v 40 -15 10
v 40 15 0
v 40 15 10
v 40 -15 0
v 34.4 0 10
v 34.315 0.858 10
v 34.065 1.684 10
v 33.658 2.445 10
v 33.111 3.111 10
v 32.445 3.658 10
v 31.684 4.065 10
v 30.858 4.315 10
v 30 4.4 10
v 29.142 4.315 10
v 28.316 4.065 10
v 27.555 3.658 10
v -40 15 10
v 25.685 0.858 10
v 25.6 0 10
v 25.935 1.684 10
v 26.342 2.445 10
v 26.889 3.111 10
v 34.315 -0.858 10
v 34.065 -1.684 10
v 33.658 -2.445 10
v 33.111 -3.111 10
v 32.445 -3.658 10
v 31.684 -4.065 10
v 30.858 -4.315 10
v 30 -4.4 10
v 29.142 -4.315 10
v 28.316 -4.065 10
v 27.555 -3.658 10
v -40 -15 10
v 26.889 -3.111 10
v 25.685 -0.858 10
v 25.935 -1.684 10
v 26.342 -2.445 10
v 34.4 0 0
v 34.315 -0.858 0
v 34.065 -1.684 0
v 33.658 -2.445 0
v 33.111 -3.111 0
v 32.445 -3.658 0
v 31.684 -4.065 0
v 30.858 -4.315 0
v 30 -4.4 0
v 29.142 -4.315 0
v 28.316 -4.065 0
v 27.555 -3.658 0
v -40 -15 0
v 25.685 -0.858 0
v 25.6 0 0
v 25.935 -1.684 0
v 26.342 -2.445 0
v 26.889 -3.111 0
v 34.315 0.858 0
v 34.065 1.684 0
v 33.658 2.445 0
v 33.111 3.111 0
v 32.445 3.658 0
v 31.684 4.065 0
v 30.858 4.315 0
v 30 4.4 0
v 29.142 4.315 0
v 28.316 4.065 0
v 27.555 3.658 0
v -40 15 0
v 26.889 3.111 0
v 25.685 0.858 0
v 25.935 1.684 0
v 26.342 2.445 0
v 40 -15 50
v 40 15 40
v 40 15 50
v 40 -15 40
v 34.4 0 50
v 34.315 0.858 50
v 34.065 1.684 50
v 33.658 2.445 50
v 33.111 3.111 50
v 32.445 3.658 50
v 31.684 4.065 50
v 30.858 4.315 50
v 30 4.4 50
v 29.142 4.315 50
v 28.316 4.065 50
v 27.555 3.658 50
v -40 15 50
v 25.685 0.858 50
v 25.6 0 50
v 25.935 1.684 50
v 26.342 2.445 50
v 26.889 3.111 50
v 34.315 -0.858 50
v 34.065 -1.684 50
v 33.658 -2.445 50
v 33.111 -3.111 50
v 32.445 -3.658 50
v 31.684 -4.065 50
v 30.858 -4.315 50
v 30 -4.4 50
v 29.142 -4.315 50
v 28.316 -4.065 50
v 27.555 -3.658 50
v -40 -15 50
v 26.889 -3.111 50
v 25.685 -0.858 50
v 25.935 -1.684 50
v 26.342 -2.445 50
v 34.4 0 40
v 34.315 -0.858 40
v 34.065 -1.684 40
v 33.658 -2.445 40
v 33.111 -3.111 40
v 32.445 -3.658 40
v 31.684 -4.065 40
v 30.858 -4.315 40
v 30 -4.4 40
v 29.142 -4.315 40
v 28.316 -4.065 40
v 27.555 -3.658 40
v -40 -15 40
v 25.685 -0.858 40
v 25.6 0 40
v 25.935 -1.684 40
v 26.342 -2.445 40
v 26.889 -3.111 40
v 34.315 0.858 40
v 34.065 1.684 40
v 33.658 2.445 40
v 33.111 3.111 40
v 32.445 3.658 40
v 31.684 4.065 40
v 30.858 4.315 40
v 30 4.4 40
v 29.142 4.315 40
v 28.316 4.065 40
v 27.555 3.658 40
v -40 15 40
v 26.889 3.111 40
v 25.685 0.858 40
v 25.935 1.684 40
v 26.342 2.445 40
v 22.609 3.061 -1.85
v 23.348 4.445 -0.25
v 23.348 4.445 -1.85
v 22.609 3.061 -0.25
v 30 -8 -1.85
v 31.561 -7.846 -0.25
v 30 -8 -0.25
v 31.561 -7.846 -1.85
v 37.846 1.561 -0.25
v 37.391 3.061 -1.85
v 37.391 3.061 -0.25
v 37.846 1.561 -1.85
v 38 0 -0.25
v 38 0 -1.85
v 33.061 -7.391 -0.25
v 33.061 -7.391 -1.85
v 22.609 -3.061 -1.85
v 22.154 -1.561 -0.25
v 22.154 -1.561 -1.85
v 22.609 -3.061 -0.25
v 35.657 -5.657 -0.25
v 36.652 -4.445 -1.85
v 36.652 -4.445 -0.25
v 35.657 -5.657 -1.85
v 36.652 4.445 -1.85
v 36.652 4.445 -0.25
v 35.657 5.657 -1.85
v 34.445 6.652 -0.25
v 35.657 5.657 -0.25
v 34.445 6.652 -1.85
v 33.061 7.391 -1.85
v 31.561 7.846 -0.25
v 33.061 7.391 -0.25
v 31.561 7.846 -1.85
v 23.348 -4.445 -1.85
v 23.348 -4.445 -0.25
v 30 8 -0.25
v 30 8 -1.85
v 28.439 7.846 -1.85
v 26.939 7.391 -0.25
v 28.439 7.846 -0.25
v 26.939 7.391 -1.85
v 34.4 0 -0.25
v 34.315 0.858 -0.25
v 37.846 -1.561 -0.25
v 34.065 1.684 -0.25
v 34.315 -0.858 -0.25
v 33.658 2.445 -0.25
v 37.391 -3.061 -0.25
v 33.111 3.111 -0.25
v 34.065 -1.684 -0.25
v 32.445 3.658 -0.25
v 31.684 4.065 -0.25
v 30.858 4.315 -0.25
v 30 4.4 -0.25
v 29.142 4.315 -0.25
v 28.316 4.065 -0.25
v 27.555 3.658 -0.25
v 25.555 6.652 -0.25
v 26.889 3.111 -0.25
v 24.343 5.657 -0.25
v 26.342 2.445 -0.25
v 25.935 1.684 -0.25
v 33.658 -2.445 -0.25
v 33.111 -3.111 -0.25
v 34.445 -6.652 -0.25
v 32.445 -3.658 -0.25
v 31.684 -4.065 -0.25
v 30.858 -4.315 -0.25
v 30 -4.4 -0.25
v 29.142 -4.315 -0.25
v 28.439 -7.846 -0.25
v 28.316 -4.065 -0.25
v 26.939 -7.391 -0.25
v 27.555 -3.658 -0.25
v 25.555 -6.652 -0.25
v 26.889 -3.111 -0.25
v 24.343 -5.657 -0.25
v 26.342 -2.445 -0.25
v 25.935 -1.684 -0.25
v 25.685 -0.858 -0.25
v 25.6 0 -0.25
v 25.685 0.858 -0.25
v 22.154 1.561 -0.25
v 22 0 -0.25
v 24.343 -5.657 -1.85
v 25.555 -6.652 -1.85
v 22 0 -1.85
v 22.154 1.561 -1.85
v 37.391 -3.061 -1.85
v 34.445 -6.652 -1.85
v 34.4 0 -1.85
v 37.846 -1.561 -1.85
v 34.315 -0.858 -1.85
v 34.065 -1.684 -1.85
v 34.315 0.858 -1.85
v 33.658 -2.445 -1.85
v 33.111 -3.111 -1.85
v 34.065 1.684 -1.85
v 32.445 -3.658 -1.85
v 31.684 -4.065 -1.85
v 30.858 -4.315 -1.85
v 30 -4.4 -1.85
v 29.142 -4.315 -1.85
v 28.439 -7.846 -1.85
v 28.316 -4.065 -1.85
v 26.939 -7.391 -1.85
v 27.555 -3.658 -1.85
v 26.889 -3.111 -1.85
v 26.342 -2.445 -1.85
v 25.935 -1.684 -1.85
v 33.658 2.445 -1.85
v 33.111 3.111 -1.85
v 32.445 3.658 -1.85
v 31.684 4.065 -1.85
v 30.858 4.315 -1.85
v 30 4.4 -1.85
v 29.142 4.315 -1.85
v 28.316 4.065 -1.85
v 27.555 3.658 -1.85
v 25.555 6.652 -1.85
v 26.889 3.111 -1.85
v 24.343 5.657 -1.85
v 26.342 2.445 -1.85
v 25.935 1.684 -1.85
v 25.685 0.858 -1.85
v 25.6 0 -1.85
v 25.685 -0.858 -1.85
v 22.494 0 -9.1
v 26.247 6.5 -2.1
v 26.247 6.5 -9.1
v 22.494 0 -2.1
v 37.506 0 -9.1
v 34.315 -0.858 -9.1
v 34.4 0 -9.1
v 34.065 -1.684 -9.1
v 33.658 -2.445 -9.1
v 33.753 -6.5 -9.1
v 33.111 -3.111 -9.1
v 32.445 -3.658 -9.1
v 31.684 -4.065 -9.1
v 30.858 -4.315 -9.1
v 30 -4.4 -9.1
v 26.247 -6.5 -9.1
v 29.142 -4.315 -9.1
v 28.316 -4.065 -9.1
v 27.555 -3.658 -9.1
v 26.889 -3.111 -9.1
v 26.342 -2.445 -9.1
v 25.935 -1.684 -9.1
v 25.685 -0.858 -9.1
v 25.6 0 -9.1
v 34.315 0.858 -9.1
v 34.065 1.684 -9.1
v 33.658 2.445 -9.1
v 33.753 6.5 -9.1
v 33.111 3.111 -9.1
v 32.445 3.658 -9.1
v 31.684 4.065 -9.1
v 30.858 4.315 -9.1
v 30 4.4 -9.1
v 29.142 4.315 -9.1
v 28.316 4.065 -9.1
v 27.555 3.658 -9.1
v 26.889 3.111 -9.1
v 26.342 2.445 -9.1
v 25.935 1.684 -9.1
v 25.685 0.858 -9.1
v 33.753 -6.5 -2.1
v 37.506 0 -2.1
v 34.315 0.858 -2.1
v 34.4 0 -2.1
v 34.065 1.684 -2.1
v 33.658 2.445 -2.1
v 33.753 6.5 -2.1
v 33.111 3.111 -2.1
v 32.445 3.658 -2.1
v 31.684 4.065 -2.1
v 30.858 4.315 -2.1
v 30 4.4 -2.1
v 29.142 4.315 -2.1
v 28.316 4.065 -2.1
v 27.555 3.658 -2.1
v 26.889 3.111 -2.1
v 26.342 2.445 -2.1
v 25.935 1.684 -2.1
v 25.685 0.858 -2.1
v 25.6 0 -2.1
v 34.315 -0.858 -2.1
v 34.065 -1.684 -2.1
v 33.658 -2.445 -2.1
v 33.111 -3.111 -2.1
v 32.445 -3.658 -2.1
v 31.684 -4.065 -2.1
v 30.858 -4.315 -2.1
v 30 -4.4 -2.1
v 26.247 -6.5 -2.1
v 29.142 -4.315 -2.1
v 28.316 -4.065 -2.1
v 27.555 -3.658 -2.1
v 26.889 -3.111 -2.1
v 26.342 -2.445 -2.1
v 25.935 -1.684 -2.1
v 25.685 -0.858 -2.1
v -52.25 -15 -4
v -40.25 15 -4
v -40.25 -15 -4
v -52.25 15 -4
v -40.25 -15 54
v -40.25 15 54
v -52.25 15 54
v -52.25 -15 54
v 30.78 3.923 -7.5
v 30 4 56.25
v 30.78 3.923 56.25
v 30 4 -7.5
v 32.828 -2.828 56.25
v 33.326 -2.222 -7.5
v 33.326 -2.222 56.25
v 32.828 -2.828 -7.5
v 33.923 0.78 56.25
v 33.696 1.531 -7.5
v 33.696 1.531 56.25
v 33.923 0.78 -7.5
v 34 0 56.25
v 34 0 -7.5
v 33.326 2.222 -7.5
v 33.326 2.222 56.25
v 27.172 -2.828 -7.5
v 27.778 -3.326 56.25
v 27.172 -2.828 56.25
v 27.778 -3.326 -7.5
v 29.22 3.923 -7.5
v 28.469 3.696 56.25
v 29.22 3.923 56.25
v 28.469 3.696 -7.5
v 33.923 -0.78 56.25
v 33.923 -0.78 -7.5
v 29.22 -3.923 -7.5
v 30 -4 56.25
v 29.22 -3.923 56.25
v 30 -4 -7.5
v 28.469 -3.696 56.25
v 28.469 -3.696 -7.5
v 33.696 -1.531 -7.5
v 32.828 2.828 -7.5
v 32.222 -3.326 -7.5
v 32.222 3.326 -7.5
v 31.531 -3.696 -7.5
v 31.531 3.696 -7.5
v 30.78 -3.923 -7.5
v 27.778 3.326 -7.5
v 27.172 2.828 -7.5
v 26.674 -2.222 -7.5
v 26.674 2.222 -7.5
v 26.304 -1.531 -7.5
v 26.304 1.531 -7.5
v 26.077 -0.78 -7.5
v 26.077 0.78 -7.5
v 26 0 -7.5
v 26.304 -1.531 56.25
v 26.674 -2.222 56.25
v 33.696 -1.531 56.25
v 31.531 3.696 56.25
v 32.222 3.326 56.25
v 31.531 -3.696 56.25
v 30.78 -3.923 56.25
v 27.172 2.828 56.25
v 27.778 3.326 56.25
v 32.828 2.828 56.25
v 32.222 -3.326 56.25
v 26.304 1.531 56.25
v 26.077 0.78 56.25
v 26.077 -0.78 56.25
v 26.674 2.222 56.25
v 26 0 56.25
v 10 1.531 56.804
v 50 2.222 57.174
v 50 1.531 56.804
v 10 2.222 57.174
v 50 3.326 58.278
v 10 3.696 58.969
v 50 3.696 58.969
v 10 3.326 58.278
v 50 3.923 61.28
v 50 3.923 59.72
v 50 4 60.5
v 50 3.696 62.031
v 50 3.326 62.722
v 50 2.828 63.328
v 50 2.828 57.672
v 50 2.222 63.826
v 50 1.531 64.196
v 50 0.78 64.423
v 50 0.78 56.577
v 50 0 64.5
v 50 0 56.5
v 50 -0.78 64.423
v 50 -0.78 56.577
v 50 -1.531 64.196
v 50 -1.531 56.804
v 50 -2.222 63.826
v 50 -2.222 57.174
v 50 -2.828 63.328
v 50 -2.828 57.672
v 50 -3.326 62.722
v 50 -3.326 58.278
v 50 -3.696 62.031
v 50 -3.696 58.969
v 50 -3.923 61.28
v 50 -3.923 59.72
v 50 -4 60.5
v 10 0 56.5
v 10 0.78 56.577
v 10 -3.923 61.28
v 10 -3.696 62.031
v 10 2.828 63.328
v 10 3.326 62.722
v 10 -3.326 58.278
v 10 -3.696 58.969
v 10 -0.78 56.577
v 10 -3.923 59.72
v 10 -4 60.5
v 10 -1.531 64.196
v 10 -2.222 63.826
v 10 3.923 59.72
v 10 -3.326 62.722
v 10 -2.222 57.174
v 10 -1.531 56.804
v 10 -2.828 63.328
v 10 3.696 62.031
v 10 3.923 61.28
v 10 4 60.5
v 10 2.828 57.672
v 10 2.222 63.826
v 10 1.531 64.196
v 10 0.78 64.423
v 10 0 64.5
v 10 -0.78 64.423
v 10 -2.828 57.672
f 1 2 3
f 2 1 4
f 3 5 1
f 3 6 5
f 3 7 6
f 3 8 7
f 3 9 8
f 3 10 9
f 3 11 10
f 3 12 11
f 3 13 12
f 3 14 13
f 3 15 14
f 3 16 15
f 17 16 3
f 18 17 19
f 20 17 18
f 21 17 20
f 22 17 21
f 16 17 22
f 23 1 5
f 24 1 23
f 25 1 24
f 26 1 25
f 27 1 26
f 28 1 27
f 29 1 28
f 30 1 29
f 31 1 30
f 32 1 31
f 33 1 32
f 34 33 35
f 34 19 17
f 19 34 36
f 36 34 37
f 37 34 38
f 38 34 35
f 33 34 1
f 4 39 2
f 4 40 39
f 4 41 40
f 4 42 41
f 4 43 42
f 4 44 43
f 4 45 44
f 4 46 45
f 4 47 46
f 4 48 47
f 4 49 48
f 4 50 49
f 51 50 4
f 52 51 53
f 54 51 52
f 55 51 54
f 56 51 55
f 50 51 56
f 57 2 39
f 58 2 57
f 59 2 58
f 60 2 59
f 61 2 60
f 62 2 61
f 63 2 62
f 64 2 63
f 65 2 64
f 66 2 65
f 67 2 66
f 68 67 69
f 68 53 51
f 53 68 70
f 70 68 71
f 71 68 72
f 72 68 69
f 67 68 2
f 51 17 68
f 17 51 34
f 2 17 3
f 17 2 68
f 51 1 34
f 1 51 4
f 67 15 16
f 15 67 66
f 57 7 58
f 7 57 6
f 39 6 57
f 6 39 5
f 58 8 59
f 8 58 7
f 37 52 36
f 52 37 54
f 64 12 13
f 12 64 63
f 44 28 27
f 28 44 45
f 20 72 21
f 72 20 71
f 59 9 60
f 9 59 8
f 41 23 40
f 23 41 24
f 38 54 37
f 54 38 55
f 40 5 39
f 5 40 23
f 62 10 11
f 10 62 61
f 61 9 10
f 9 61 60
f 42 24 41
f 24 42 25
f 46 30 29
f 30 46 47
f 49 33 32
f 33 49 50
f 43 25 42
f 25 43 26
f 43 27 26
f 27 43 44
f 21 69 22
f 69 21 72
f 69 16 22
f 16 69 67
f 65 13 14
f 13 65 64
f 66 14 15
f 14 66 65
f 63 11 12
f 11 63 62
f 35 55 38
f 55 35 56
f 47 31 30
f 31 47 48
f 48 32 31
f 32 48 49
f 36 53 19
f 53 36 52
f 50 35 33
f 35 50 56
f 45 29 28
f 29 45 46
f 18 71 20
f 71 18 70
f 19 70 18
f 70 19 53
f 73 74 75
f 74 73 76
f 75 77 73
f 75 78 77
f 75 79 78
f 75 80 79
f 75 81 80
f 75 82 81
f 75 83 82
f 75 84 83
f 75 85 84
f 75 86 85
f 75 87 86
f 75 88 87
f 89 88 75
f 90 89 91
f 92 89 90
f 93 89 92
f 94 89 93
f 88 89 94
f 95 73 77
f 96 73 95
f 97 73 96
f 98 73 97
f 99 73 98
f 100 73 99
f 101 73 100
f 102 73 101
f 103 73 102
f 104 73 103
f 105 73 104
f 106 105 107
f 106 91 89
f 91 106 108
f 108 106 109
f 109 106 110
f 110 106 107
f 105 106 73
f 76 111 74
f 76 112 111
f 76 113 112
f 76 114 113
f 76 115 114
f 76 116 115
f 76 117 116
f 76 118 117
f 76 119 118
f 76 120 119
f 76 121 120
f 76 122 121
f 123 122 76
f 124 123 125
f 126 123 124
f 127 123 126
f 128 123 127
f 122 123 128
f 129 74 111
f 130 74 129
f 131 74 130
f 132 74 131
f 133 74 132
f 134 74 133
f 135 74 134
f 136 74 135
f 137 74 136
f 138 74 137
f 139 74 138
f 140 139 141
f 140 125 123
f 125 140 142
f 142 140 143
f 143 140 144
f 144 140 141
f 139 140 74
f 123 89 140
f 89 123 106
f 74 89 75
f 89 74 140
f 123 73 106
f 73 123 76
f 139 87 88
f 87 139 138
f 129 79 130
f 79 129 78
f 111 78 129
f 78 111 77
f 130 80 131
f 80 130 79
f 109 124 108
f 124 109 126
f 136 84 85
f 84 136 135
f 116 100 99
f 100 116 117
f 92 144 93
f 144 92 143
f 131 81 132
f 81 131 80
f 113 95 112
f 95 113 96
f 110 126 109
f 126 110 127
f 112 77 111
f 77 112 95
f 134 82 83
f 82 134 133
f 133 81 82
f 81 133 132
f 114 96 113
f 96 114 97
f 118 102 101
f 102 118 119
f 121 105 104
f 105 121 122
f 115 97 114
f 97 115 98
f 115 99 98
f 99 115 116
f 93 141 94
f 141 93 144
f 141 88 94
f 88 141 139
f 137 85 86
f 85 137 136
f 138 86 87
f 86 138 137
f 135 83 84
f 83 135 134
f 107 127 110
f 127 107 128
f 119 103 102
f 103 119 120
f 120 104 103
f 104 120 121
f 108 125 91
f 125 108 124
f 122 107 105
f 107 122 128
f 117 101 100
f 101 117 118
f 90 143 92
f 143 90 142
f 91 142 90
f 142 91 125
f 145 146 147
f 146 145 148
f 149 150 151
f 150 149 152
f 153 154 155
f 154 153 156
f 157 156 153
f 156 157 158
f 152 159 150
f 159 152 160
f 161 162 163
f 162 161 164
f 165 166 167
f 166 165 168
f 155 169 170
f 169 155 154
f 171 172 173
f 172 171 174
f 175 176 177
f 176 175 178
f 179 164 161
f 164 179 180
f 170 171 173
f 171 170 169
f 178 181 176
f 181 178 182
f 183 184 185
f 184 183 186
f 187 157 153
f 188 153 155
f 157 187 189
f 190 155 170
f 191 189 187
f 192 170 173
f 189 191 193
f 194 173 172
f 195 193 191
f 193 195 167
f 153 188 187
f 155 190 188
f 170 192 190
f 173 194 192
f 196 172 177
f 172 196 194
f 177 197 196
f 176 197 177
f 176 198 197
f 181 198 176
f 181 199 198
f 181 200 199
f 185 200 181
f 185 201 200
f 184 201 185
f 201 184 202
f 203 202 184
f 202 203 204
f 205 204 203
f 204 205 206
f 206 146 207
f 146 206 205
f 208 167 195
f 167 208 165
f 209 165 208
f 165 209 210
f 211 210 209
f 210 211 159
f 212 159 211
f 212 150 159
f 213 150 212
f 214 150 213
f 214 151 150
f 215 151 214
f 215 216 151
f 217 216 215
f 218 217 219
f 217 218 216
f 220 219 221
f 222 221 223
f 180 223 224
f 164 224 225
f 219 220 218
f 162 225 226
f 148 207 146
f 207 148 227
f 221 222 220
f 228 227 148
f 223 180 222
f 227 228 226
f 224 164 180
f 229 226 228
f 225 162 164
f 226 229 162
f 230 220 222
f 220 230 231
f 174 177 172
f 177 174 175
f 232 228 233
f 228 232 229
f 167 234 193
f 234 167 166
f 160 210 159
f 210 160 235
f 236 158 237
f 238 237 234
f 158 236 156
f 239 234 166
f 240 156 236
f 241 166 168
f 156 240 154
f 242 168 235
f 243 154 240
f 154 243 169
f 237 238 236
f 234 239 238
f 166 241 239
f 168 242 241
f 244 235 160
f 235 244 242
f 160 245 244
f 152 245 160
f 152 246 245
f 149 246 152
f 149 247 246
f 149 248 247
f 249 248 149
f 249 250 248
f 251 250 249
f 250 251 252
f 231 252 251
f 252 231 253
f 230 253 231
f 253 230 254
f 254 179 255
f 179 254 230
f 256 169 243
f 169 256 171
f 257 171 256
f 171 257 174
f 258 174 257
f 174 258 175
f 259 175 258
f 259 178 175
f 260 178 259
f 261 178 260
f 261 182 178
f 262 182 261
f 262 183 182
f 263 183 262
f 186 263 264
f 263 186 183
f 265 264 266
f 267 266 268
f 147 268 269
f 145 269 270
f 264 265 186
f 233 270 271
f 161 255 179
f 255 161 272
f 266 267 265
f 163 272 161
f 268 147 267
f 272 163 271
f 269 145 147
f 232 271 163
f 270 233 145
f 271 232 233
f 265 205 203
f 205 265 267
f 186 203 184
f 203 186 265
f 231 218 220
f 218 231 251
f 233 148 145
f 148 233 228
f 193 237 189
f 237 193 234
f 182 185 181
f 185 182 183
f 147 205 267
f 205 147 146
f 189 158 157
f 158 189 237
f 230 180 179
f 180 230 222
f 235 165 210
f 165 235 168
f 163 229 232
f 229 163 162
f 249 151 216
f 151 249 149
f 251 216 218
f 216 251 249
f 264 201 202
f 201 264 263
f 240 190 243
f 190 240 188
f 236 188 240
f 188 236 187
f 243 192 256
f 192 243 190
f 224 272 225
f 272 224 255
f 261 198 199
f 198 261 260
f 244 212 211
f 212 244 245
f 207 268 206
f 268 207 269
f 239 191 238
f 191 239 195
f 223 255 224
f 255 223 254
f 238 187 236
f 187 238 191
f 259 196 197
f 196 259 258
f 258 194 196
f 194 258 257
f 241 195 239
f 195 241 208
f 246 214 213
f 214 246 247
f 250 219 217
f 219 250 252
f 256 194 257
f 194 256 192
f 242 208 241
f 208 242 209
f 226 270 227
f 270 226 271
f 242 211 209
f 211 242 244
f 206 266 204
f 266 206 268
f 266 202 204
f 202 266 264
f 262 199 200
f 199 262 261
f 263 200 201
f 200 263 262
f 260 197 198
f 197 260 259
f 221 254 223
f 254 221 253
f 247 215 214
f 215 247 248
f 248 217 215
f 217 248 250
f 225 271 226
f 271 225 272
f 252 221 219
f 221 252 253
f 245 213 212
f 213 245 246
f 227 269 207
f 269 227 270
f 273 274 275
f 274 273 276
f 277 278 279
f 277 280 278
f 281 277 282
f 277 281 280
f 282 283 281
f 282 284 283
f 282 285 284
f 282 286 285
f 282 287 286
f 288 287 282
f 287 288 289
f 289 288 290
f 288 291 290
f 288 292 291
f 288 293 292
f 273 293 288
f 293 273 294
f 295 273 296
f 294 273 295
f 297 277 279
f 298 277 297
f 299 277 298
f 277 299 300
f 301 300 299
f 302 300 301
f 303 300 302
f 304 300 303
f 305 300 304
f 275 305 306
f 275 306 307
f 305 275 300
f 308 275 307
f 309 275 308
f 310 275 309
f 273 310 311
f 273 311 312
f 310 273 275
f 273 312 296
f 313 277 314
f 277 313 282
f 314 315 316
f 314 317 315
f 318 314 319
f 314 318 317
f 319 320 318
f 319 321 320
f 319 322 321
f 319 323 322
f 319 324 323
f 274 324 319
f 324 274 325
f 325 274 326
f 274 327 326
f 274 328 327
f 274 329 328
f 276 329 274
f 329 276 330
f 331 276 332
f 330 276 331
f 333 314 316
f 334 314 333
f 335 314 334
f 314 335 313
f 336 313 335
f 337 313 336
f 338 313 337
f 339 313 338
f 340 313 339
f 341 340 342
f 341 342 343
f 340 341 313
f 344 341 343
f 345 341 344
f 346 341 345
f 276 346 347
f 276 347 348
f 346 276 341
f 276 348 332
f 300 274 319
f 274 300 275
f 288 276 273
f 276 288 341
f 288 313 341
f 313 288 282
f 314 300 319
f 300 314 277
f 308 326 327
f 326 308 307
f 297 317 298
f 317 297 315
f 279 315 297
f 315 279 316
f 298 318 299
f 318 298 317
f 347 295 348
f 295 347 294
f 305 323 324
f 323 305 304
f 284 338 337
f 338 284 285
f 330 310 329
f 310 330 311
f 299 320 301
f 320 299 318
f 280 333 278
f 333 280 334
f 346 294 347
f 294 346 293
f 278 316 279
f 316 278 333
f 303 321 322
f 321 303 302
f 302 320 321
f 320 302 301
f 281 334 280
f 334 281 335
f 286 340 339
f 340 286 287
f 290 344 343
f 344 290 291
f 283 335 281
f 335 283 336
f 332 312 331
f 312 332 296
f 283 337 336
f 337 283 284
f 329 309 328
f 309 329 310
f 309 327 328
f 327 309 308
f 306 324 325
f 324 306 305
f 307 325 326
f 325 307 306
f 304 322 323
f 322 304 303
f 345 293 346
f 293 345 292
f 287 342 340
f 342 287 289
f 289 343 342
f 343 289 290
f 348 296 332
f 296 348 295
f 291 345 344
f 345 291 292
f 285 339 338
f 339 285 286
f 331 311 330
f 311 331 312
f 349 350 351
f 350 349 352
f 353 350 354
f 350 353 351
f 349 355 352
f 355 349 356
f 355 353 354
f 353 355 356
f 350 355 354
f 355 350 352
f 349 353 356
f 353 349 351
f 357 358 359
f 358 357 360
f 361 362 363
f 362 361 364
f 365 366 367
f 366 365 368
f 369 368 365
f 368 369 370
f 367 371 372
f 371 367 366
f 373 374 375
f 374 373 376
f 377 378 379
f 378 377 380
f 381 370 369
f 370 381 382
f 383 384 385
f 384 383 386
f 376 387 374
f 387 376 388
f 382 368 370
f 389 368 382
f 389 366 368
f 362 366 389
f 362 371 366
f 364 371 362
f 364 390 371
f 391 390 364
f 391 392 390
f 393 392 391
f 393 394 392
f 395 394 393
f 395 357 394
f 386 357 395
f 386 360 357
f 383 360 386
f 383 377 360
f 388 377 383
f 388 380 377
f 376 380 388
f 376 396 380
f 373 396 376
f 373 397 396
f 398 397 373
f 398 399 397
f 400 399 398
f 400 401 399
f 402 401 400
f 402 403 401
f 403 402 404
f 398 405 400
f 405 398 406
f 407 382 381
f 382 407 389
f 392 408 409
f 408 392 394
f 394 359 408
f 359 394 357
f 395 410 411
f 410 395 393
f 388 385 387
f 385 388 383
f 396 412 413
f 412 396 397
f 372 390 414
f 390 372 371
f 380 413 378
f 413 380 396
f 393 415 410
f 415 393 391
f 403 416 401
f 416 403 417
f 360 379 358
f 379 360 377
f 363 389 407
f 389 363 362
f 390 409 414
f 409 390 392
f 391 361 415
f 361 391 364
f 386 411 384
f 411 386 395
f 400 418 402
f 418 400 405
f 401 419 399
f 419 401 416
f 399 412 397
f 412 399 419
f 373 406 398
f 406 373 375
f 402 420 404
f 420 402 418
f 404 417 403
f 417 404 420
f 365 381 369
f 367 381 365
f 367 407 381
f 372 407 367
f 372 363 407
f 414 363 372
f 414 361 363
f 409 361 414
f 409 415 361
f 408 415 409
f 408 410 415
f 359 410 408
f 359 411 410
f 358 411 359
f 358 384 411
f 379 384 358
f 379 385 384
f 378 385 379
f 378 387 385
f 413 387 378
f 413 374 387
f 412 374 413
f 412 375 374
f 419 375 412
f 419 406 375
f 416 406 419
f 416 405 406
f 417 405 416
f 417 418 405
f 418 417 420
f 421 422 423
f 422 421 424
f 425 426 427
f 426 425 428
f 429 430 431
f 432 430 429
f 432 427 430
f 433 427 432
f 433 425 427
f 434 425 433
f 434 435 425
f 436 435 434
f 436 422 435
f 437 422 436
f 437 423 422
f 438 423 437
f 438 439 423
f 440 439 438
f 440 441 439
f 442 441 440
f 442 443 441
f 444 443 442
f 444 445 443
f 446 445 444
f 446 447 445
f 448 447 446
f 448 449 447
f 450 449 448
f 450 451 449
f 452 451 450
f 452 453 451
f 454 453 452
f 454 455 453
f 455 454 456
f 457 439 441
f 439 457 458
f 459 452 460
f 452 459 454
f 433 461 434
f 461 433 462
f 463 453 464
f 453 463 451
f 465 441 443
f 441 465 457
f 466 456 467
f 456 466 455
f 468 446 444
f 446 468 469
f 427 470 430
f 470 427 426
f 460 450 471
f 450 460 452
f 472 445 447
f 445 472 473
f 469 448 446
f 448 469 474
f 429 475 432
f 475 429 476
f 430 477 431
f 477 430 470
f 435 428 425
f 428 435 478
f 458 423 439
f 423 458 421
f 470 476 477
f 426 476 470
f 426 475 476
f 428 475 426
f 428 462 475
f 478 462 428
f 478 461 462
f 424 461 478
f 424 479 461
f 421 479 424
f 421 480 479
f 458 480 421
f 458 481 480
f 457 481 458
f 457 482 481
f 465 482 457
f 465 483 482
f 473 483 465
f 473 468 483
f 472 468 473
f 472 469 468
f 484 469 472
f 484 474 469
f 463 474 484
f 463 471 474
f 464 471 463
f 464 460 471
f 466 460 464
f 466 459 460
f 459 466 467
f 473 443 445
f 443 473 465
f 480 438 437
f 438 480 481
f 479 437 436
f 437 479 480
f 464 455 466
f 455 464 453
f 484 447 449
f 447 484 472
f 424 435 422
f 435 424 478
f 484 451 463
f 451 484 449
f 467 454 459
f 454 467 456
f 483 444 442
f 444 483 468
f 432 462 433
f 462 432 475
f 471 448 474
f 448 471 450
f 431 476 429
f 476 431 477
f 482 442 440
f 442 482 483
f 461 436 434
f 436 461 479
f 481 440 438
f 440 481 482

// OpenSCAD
$fn = 32;

// ------------------------------------------------------------------------
// C clamp: throat 40 mm, screw d8
// Every part is its own module, assembly() places every instance.
// ------------------------------------------------------------------------

// --- part 1 ---
module clamp_arm() {
  difference() {
    translate([-40, -15, 0]) cube([80, 30, 10]);
    translate([30, 0, -1]) cylinder(h = 12, d = 8.8);
  }
}

// --- part 2 ---
module clamp_spine() {
  difference() {
    translate([-29, -15, 0]) cube([58, 30, 12]);
  }
}

// --- part 3 ---
module clamp_screw() {
  translate([0, 0, -31.875]) cylinder(h = 63.75, d = 8);
}

// --- part 4 ---
module clamp_washer() {
  difference() {
      translate([0, 0, 0]) cylinder(h = 1.6, d = 16);
      translate([0, 0, -1]) cylinder(h = 3.6, d = 8.8);
    }
}

// --- part 5 ---
module clamp_nut() {
  difference() {
    linear_extrude(height = 7) polygon(points = [[7.506, 0], [3.753, 6.5], [-3.753, 6.5], [-7.506, 0], [-3.753, -6.5], [3.753, -6.5]]);
    translate([0, 0, -1]) cylinder(h = 9, d = 8.8);
  }
}

// --- part 6 ---
module tommy_bar() {
  translate([0, 0, -20]) cylinder(h = 40, d = 8);
}

// --- assembly ---
module assembly() {
  color([0.80, 0.24, 0.20]) translate([0, 0, 0]) rotate([0, 0, 0]) clamp_arm();
  color([0.20, 0.45, 0.75]) translate([0, 0, 40]) rotate([0, 0, 0]) clamp_arm();
  color([0.25, 0.62, 0.32]) translate([-52.25, 0, 25]) rotate([0, 90, 0]) clamp_spine();
  color([0.92, 0.70, 0.18]) translate([30, 0, 24.375]) rotate([0, 0, 0]) clamp_screw();
  color([0.58, 0.35, 0.70]) translate([30, 0, -1.85]) rotate([0, 0, 0]) clamp_washer();
  color([0.16, 0.66, 0.66]) translate([30, 0, -9.1]) rotate([0, 0, 0]) clamp_nut();
  color([0.85, 0.48, 0.18]) translate([30, 0, 60.5]) rotate([0, 90, 0]) tommy_bar();
}

assembly();
